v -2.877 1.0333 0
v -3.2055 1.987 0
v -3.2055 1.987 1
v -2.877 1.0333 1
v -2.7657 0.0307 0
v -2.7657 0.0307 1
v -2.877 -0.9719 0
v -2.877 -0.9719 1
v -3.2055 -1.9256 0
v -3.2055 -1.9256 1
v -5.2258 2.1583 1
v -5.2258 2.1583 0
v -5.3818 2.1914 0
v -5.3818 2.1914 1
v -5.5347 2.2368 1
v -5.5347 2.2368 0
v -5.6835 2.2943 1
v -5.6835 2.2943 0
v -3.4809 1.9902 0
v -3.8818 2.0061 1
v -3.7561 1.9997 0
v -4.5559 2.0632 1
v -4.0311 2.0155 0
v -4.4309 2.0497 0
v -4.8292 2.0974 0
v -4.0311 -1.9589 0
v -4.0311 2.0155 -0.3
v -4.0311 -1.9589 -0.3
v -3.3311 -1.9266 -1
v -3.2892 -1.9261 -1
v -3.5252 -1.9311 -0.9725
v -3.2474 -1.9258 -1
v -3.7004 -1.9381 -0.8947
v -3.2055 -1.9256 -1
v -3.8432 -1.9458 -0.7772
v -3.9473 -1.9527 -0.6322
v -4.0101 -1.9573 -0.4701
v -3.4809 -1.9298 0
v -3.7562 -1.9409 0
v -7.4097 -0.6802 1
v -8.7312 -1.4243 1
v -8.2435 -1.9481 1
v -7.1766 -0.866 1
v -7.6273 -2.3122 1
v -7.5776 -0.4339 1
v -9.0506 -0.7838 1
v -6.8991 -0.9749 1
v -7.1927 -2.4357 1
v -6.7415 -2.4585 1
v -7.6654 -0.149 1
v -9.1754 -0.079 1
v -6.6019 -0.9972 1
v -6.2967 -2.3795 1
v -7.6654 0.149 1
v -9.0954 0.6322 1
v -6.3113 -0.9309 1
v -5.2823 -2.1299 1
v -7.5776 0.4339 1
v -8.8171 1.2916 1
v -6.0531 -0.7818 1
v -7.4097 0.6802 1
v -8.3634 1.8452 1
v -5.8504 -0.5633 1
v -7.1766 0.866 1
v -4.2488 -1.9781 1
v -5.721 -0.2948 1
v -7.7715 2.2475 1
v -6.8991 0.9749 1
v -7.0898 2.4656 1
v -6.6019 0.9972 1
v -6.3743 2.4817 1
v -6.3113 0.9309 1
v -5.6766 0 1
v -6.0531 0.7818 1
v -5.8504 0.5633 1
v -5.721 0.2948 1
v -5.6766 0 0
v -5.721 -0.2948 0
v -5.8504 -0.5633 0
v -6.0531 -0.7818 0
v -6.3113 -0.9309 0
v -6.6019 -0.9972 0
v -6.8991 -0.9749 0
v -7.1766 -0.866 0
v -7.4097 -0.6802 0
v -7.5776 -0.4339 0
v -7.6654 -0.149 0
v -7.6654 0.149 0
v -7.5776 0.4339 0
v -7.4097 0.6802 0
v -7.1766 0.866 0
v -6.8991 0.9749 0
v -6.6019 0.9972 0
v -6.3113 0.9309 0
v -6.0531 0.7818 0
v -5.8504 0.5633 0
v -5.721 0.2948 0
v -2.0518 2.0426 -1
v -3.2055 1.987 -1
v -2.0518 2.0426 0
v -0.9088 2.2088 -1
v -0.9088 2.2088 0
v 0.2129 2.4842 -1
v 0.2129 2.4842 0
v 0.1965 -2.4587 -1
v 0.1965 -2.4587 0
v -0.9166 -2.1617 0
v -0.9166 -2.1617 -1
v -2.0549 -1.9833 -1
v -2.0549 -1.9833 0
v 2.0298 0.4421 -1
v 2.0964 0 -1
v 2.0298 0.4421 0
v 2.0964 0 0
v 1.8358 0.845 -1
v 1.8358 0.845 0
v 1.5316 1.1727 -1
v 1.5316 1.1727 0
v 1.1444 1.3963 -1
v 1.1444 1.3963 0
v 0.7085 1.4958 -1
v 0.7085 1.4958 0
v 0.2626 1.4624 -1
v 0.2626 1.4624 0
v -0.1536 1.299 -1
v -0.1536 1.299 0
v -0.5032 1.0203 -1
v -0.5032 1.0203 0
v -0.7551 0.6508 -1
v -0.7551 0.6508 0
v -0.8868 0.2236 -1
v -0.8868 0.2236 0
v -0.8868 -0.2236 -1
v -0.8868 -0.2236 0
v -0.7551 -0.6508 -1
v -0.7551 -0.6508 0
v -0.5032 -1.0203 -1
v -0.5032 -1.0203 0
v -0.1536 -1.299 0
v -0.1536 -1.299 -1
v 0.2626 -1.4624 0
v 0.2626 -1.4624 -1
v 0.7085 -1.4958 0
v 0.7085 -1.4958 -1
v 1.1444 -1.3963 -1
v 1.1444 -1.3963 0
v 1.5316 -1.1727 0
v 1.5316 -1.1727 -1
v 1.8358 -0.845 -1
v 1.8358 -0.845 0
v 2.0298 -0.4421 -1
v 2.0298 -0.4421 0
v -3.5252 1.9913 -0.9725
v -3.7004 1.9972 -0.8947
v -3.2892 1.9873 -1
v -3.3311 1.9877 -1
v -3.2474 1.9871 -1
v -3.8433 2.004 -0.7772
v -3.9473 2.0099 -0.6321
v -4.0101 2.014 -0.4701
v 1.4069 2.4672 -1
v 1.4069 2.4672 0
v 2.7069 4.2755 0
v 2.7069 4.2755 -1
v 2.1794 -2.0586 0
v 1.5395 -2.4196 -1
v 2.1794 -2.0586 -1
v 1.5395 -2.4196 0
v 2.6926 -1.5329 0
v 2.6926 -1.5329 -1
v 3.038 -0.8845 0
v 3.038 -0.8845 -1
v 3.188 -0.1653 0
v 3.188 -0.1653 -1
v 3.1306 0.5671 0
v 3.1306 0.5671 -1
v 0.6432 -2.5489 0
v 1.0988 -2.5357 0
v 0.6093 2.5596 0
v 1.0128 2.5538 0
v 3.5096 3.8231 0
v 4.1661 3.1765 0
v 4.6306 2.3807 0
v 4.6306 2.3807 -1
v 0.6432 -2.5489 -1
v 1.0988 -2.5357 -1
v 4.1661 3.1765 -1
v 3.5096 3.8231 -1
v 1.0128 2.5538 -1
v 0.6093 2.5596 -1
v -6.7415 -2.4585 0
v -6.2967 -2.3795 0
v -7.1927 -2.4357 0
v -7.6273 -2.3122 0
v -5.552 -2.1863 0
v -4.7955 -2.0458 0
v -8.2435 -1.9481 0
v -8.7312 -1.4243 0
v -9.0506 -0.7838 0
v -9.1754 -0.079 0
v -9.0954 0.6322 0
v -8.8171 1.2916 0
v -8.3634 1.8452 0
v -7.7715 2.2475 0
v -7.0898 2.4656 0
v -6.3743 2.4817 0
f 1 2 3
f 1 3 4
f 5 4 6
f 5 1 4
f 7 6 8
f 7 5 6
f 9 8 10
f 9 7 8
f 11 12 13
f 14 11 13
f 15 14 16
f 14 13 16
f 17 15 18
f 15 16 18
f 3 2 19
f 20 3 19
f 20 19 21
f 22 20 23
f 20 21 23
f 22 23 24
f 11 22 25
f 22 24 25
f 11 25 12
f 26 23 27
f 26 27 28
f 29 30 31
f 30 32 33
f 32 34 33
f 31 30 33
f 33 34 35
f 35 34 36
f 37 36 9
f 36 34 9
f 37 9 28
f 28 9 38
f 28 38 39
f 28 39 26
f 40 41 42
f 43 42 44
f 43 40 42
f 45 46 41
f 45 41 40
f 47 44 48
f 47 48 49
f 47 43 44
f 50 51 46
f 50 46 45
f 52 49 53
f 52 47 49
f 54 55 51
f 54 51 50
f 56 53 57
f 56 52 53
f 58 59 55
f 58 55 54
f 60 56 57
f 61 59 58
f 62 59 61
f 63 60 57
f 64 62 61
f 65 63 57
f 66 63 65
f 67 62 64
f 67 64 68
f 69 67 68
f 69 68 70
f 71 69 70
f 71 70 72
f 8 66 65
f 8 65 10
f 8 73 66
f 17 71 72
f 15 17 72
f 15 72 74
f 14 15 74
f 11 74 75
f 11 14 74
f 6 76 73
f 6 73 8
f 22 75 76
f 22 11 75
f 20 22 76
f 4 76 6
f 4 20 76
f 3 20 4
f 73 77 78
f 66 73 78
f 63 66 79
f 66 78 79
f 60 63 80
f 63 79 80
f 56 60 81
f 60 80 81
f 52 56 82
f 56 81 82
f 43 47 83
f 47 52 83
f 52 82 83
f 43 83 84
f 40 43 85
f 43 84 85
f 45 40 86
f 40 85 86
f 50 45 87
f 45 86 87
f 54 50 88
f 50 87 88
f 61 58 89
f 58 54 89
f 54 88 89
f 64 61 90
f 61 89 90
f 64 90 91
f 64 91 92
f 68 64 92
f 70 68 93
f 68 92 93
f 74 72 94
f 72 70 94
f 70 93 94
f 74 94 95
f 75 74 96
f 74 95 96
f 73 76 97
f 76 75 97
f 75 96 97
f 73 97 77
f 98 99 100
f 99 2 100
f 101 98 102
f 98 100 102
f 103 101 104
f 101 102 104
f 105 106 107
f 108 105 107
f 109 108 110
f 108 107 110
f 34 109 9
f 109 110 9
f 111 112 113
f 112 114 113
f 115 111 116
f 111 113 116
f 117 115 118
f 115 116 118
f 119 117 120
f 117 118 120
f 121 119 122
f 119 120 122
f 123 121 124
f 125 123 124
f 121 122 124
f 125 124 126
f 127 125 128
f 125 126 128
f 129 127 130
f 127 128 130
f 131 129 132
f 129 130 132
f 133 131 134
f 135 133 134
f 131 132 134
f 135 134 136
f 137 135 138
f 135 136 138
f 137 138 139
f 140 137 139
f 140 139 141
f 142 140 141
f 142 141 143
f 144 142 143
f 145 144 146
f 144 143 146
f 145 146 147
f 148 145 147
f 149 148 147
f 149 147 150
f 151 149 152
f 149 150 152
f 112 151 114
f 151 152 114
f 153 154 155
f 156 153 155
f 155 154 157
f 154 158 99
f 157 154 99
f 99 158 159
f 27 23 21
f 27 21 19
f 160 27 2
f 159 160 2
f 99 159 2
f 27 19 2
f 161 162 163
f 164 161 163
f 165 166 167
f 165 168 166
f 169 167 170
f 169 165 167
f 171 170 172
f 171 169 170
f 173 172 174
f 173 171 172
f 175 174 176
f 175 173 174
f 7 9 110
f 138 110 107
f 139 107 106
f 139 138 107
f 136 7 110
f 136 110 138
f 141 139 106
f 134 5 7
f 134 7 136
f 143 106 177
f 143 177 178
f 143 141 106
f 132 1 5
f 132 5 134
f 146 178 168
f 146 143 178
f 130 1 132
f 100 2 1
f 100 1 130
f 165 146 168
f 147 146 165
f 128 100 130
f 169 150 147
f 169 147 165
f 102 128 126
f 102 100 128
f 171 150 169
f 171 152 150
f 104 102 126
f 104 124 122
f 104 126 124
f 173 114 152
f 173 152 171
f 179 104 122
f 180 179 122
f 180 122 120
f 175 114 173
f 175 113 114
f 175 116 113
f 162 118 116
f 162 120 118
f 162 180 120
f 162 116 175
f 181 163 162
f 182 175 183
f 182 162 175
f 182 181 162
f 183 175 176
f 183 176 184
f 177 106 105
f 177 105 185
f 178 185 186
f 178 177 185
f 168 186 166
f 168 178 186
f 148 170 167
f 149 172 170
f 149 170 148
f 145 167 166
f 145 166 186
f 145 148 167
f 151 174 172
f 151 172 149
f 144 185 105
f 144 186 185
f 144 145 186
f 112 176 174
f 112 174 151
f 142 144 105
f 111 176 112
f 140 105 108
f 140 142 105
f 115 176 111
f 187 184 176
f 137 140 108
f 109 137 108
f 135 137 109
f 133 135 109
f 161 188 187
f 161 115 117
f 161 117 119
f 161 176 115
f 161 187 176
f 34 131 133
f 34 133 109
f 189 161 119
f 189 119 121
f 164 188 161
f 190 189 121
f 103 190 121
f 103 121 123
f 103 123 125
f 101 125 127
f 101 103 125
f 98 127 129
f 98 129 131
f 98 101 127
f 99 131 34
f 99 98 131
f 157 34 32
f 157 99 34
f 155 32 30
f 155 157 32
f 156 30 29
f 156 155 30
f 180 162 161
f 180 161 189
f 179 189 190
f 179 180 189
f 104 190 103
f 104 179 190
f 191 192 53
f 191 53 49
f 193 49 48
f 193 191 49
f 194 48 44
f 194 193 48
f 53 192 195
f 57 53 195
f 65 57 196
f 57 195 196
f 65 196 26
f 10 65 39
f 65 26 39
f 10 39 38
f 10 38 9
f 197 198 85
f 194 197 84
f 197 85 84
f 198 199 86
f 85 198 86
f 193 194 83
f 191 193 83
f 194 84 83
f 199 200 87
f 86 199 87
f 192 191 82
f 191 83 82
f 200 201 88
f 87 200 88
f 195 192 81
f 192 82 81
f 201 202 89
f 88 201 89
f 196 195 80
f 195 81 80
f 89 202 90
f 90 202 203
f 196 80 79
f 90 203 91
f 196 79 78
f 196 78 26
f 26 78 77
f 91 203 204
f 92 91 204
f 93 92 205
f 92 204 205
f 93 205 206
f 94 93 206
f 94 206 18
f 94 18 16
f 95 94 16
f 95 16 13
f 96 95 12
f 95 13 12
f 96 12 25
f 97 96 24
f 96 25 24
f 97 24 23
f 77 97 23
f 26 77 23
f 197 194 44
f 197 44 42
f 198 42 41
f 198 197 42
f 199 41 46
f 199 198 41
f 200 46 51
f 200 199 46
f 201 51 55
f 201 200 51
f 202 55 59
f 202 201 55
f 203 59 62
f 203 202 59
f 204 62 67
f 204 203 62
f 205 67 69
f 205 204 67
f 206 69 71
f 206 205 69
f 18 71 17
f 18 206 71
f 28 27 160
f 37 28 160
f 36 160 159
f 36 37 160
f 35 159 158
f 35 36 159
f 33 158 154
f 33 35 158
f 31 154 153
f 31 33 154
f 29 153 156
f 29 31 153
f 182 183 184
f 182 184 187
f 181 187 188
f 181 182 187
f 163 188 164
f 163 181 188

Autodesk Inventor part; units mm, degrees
ref_plane "YZ Plane" through (0, 0, 0) normal (1, 0, 0) x (0, 1, 0)
ref_plane "XZ Plane" through (0, 0, 0) normal (0, 1, 0) x (-1, 0, 0)
ref_plane "XY Plane" through (0, 0, 0) normal (0, 0, 1) x (1, 0, 0)
sketch "Sketch1" plane through (0, 0, 0) normal (0, 0, 1) x (1, 0, 0)
  arc A0 (-5.6835, 2.2943) -> (-7.6273, -2.3122) centre (-6.6766, 0) ccw
  arc A1 (-5.2258, 2.1583) -> (0.2129, 2.4842) centre (-3.2055, 13.987) ccw
  line L0 (-6.6766, 2.5) -> (-6.6766, -2.5) construction
  arc A2 (-5.6835, 2.2943) -> (-5.2258, 2.1583) centre (-4.8891, 4.1298) ccw
  arc A3 (1.5395, -2.4196) -> (1.4069, 2.4672) centre (0.5964, 0) ccw
  arc A4 (1.4069, 2.4672) -> (0.2129, 2.4842) centre (0.7827, 0.5671) ccw
  line L1 (0.5964, 2.5969) -> (0.5964, -2.5969) construction
  arc A5 (0.1965, -2.4587) -> (-6.2967, -2.3795) centre (-3.1776, -12.8694) ccw
  arc A6 (-7.6273, -2.3122) -> (-6.2967, -2.3795) centre (-6.8667, -0.4624) ccw
  arc A7 (0.1965, -2.4587) -> (1.5395, -2.4196) centre (0.8132, -0.5562) ccw
  circle A8 centre (-6.6766, 0) radius 1
  circle A9 centre (0.5964, 0) radius 1.5
  line L2 (1.4069, 2.4672) -> (2.7069, 4.2755)
  line L3 (3.1306, 0.5671) -> (4.6306, 2.3807)
  arc A10 (4.6306, 2.3807) -> (2.7069, 4.2755) centre (1.4088, 1.0336) ccw
  line L4 (-3.2055, 1.987) -> (-3.2055, -1.9256) construction
  line L5 (-3.2055, 1.987) -> (-3.2055, -1.9256) construction
  arc A11 (-3.2055, -1.9256) -> (-3.2055, 1.987) centre (-7.3367, 0.0307) ccw
  point P0 (0, 0)
  dimension "d0" = 5
  dimension "d1" = 12
  dimension "d2" = 2
  dimension "d3" = 2
  dimension "d5" = 2
  dimension "d6" = 2
  dimension "d7" = 3
  dimension "d8" = 1.5
  dimension "d9" = 1.3
extrude "Extrusion1" add sketch "Sketch1" along normal blind 1 contours A2 A1 A11 A5 A6 A0
extrude "Extrusion2" add sketch "Sketch1" against normal blind 1 contours A1 A4 A3 A7 A5 A11
extrude "Extrusion3" add sketch "Sketch1" against normal blind 1 contours L2 A10 L3 A3
sketch "Esboço2" plane through (0, 0, 0) normal (0, 0, -1) x (-1, 0, 0)
  line L0 (4.0311, 2.0155) -> (4.0311, -1.9589)
  arc A0 (3.2055, 1.987) -> (3.2055, -1.9256) centre (7.3367, 0.0307) ccw projected
  arc A1 (3.2055, 1.987) -> (3.2055, -1.9256) centre (7.3367, 0.0307) ccw
  arc A2 (3.2055, 1.987) -> (5.2258, 2.1583) centre (3.2055, 13.987) ccw projected
  arc A3 (6.2967, -2.3795) -> (3.2055, -1.9256) centre (3.1776, -12.8694) ccw projected
  point P0 (0, 0)
extrude "Extrusão4" add sketch "Esboço2" along normal blind 1
fillet "Arredondamento1" radius 0.7 1 edges at (-4.0311, 0.0283, -1)
properties material "Nickel-Copper Alloy 400"
